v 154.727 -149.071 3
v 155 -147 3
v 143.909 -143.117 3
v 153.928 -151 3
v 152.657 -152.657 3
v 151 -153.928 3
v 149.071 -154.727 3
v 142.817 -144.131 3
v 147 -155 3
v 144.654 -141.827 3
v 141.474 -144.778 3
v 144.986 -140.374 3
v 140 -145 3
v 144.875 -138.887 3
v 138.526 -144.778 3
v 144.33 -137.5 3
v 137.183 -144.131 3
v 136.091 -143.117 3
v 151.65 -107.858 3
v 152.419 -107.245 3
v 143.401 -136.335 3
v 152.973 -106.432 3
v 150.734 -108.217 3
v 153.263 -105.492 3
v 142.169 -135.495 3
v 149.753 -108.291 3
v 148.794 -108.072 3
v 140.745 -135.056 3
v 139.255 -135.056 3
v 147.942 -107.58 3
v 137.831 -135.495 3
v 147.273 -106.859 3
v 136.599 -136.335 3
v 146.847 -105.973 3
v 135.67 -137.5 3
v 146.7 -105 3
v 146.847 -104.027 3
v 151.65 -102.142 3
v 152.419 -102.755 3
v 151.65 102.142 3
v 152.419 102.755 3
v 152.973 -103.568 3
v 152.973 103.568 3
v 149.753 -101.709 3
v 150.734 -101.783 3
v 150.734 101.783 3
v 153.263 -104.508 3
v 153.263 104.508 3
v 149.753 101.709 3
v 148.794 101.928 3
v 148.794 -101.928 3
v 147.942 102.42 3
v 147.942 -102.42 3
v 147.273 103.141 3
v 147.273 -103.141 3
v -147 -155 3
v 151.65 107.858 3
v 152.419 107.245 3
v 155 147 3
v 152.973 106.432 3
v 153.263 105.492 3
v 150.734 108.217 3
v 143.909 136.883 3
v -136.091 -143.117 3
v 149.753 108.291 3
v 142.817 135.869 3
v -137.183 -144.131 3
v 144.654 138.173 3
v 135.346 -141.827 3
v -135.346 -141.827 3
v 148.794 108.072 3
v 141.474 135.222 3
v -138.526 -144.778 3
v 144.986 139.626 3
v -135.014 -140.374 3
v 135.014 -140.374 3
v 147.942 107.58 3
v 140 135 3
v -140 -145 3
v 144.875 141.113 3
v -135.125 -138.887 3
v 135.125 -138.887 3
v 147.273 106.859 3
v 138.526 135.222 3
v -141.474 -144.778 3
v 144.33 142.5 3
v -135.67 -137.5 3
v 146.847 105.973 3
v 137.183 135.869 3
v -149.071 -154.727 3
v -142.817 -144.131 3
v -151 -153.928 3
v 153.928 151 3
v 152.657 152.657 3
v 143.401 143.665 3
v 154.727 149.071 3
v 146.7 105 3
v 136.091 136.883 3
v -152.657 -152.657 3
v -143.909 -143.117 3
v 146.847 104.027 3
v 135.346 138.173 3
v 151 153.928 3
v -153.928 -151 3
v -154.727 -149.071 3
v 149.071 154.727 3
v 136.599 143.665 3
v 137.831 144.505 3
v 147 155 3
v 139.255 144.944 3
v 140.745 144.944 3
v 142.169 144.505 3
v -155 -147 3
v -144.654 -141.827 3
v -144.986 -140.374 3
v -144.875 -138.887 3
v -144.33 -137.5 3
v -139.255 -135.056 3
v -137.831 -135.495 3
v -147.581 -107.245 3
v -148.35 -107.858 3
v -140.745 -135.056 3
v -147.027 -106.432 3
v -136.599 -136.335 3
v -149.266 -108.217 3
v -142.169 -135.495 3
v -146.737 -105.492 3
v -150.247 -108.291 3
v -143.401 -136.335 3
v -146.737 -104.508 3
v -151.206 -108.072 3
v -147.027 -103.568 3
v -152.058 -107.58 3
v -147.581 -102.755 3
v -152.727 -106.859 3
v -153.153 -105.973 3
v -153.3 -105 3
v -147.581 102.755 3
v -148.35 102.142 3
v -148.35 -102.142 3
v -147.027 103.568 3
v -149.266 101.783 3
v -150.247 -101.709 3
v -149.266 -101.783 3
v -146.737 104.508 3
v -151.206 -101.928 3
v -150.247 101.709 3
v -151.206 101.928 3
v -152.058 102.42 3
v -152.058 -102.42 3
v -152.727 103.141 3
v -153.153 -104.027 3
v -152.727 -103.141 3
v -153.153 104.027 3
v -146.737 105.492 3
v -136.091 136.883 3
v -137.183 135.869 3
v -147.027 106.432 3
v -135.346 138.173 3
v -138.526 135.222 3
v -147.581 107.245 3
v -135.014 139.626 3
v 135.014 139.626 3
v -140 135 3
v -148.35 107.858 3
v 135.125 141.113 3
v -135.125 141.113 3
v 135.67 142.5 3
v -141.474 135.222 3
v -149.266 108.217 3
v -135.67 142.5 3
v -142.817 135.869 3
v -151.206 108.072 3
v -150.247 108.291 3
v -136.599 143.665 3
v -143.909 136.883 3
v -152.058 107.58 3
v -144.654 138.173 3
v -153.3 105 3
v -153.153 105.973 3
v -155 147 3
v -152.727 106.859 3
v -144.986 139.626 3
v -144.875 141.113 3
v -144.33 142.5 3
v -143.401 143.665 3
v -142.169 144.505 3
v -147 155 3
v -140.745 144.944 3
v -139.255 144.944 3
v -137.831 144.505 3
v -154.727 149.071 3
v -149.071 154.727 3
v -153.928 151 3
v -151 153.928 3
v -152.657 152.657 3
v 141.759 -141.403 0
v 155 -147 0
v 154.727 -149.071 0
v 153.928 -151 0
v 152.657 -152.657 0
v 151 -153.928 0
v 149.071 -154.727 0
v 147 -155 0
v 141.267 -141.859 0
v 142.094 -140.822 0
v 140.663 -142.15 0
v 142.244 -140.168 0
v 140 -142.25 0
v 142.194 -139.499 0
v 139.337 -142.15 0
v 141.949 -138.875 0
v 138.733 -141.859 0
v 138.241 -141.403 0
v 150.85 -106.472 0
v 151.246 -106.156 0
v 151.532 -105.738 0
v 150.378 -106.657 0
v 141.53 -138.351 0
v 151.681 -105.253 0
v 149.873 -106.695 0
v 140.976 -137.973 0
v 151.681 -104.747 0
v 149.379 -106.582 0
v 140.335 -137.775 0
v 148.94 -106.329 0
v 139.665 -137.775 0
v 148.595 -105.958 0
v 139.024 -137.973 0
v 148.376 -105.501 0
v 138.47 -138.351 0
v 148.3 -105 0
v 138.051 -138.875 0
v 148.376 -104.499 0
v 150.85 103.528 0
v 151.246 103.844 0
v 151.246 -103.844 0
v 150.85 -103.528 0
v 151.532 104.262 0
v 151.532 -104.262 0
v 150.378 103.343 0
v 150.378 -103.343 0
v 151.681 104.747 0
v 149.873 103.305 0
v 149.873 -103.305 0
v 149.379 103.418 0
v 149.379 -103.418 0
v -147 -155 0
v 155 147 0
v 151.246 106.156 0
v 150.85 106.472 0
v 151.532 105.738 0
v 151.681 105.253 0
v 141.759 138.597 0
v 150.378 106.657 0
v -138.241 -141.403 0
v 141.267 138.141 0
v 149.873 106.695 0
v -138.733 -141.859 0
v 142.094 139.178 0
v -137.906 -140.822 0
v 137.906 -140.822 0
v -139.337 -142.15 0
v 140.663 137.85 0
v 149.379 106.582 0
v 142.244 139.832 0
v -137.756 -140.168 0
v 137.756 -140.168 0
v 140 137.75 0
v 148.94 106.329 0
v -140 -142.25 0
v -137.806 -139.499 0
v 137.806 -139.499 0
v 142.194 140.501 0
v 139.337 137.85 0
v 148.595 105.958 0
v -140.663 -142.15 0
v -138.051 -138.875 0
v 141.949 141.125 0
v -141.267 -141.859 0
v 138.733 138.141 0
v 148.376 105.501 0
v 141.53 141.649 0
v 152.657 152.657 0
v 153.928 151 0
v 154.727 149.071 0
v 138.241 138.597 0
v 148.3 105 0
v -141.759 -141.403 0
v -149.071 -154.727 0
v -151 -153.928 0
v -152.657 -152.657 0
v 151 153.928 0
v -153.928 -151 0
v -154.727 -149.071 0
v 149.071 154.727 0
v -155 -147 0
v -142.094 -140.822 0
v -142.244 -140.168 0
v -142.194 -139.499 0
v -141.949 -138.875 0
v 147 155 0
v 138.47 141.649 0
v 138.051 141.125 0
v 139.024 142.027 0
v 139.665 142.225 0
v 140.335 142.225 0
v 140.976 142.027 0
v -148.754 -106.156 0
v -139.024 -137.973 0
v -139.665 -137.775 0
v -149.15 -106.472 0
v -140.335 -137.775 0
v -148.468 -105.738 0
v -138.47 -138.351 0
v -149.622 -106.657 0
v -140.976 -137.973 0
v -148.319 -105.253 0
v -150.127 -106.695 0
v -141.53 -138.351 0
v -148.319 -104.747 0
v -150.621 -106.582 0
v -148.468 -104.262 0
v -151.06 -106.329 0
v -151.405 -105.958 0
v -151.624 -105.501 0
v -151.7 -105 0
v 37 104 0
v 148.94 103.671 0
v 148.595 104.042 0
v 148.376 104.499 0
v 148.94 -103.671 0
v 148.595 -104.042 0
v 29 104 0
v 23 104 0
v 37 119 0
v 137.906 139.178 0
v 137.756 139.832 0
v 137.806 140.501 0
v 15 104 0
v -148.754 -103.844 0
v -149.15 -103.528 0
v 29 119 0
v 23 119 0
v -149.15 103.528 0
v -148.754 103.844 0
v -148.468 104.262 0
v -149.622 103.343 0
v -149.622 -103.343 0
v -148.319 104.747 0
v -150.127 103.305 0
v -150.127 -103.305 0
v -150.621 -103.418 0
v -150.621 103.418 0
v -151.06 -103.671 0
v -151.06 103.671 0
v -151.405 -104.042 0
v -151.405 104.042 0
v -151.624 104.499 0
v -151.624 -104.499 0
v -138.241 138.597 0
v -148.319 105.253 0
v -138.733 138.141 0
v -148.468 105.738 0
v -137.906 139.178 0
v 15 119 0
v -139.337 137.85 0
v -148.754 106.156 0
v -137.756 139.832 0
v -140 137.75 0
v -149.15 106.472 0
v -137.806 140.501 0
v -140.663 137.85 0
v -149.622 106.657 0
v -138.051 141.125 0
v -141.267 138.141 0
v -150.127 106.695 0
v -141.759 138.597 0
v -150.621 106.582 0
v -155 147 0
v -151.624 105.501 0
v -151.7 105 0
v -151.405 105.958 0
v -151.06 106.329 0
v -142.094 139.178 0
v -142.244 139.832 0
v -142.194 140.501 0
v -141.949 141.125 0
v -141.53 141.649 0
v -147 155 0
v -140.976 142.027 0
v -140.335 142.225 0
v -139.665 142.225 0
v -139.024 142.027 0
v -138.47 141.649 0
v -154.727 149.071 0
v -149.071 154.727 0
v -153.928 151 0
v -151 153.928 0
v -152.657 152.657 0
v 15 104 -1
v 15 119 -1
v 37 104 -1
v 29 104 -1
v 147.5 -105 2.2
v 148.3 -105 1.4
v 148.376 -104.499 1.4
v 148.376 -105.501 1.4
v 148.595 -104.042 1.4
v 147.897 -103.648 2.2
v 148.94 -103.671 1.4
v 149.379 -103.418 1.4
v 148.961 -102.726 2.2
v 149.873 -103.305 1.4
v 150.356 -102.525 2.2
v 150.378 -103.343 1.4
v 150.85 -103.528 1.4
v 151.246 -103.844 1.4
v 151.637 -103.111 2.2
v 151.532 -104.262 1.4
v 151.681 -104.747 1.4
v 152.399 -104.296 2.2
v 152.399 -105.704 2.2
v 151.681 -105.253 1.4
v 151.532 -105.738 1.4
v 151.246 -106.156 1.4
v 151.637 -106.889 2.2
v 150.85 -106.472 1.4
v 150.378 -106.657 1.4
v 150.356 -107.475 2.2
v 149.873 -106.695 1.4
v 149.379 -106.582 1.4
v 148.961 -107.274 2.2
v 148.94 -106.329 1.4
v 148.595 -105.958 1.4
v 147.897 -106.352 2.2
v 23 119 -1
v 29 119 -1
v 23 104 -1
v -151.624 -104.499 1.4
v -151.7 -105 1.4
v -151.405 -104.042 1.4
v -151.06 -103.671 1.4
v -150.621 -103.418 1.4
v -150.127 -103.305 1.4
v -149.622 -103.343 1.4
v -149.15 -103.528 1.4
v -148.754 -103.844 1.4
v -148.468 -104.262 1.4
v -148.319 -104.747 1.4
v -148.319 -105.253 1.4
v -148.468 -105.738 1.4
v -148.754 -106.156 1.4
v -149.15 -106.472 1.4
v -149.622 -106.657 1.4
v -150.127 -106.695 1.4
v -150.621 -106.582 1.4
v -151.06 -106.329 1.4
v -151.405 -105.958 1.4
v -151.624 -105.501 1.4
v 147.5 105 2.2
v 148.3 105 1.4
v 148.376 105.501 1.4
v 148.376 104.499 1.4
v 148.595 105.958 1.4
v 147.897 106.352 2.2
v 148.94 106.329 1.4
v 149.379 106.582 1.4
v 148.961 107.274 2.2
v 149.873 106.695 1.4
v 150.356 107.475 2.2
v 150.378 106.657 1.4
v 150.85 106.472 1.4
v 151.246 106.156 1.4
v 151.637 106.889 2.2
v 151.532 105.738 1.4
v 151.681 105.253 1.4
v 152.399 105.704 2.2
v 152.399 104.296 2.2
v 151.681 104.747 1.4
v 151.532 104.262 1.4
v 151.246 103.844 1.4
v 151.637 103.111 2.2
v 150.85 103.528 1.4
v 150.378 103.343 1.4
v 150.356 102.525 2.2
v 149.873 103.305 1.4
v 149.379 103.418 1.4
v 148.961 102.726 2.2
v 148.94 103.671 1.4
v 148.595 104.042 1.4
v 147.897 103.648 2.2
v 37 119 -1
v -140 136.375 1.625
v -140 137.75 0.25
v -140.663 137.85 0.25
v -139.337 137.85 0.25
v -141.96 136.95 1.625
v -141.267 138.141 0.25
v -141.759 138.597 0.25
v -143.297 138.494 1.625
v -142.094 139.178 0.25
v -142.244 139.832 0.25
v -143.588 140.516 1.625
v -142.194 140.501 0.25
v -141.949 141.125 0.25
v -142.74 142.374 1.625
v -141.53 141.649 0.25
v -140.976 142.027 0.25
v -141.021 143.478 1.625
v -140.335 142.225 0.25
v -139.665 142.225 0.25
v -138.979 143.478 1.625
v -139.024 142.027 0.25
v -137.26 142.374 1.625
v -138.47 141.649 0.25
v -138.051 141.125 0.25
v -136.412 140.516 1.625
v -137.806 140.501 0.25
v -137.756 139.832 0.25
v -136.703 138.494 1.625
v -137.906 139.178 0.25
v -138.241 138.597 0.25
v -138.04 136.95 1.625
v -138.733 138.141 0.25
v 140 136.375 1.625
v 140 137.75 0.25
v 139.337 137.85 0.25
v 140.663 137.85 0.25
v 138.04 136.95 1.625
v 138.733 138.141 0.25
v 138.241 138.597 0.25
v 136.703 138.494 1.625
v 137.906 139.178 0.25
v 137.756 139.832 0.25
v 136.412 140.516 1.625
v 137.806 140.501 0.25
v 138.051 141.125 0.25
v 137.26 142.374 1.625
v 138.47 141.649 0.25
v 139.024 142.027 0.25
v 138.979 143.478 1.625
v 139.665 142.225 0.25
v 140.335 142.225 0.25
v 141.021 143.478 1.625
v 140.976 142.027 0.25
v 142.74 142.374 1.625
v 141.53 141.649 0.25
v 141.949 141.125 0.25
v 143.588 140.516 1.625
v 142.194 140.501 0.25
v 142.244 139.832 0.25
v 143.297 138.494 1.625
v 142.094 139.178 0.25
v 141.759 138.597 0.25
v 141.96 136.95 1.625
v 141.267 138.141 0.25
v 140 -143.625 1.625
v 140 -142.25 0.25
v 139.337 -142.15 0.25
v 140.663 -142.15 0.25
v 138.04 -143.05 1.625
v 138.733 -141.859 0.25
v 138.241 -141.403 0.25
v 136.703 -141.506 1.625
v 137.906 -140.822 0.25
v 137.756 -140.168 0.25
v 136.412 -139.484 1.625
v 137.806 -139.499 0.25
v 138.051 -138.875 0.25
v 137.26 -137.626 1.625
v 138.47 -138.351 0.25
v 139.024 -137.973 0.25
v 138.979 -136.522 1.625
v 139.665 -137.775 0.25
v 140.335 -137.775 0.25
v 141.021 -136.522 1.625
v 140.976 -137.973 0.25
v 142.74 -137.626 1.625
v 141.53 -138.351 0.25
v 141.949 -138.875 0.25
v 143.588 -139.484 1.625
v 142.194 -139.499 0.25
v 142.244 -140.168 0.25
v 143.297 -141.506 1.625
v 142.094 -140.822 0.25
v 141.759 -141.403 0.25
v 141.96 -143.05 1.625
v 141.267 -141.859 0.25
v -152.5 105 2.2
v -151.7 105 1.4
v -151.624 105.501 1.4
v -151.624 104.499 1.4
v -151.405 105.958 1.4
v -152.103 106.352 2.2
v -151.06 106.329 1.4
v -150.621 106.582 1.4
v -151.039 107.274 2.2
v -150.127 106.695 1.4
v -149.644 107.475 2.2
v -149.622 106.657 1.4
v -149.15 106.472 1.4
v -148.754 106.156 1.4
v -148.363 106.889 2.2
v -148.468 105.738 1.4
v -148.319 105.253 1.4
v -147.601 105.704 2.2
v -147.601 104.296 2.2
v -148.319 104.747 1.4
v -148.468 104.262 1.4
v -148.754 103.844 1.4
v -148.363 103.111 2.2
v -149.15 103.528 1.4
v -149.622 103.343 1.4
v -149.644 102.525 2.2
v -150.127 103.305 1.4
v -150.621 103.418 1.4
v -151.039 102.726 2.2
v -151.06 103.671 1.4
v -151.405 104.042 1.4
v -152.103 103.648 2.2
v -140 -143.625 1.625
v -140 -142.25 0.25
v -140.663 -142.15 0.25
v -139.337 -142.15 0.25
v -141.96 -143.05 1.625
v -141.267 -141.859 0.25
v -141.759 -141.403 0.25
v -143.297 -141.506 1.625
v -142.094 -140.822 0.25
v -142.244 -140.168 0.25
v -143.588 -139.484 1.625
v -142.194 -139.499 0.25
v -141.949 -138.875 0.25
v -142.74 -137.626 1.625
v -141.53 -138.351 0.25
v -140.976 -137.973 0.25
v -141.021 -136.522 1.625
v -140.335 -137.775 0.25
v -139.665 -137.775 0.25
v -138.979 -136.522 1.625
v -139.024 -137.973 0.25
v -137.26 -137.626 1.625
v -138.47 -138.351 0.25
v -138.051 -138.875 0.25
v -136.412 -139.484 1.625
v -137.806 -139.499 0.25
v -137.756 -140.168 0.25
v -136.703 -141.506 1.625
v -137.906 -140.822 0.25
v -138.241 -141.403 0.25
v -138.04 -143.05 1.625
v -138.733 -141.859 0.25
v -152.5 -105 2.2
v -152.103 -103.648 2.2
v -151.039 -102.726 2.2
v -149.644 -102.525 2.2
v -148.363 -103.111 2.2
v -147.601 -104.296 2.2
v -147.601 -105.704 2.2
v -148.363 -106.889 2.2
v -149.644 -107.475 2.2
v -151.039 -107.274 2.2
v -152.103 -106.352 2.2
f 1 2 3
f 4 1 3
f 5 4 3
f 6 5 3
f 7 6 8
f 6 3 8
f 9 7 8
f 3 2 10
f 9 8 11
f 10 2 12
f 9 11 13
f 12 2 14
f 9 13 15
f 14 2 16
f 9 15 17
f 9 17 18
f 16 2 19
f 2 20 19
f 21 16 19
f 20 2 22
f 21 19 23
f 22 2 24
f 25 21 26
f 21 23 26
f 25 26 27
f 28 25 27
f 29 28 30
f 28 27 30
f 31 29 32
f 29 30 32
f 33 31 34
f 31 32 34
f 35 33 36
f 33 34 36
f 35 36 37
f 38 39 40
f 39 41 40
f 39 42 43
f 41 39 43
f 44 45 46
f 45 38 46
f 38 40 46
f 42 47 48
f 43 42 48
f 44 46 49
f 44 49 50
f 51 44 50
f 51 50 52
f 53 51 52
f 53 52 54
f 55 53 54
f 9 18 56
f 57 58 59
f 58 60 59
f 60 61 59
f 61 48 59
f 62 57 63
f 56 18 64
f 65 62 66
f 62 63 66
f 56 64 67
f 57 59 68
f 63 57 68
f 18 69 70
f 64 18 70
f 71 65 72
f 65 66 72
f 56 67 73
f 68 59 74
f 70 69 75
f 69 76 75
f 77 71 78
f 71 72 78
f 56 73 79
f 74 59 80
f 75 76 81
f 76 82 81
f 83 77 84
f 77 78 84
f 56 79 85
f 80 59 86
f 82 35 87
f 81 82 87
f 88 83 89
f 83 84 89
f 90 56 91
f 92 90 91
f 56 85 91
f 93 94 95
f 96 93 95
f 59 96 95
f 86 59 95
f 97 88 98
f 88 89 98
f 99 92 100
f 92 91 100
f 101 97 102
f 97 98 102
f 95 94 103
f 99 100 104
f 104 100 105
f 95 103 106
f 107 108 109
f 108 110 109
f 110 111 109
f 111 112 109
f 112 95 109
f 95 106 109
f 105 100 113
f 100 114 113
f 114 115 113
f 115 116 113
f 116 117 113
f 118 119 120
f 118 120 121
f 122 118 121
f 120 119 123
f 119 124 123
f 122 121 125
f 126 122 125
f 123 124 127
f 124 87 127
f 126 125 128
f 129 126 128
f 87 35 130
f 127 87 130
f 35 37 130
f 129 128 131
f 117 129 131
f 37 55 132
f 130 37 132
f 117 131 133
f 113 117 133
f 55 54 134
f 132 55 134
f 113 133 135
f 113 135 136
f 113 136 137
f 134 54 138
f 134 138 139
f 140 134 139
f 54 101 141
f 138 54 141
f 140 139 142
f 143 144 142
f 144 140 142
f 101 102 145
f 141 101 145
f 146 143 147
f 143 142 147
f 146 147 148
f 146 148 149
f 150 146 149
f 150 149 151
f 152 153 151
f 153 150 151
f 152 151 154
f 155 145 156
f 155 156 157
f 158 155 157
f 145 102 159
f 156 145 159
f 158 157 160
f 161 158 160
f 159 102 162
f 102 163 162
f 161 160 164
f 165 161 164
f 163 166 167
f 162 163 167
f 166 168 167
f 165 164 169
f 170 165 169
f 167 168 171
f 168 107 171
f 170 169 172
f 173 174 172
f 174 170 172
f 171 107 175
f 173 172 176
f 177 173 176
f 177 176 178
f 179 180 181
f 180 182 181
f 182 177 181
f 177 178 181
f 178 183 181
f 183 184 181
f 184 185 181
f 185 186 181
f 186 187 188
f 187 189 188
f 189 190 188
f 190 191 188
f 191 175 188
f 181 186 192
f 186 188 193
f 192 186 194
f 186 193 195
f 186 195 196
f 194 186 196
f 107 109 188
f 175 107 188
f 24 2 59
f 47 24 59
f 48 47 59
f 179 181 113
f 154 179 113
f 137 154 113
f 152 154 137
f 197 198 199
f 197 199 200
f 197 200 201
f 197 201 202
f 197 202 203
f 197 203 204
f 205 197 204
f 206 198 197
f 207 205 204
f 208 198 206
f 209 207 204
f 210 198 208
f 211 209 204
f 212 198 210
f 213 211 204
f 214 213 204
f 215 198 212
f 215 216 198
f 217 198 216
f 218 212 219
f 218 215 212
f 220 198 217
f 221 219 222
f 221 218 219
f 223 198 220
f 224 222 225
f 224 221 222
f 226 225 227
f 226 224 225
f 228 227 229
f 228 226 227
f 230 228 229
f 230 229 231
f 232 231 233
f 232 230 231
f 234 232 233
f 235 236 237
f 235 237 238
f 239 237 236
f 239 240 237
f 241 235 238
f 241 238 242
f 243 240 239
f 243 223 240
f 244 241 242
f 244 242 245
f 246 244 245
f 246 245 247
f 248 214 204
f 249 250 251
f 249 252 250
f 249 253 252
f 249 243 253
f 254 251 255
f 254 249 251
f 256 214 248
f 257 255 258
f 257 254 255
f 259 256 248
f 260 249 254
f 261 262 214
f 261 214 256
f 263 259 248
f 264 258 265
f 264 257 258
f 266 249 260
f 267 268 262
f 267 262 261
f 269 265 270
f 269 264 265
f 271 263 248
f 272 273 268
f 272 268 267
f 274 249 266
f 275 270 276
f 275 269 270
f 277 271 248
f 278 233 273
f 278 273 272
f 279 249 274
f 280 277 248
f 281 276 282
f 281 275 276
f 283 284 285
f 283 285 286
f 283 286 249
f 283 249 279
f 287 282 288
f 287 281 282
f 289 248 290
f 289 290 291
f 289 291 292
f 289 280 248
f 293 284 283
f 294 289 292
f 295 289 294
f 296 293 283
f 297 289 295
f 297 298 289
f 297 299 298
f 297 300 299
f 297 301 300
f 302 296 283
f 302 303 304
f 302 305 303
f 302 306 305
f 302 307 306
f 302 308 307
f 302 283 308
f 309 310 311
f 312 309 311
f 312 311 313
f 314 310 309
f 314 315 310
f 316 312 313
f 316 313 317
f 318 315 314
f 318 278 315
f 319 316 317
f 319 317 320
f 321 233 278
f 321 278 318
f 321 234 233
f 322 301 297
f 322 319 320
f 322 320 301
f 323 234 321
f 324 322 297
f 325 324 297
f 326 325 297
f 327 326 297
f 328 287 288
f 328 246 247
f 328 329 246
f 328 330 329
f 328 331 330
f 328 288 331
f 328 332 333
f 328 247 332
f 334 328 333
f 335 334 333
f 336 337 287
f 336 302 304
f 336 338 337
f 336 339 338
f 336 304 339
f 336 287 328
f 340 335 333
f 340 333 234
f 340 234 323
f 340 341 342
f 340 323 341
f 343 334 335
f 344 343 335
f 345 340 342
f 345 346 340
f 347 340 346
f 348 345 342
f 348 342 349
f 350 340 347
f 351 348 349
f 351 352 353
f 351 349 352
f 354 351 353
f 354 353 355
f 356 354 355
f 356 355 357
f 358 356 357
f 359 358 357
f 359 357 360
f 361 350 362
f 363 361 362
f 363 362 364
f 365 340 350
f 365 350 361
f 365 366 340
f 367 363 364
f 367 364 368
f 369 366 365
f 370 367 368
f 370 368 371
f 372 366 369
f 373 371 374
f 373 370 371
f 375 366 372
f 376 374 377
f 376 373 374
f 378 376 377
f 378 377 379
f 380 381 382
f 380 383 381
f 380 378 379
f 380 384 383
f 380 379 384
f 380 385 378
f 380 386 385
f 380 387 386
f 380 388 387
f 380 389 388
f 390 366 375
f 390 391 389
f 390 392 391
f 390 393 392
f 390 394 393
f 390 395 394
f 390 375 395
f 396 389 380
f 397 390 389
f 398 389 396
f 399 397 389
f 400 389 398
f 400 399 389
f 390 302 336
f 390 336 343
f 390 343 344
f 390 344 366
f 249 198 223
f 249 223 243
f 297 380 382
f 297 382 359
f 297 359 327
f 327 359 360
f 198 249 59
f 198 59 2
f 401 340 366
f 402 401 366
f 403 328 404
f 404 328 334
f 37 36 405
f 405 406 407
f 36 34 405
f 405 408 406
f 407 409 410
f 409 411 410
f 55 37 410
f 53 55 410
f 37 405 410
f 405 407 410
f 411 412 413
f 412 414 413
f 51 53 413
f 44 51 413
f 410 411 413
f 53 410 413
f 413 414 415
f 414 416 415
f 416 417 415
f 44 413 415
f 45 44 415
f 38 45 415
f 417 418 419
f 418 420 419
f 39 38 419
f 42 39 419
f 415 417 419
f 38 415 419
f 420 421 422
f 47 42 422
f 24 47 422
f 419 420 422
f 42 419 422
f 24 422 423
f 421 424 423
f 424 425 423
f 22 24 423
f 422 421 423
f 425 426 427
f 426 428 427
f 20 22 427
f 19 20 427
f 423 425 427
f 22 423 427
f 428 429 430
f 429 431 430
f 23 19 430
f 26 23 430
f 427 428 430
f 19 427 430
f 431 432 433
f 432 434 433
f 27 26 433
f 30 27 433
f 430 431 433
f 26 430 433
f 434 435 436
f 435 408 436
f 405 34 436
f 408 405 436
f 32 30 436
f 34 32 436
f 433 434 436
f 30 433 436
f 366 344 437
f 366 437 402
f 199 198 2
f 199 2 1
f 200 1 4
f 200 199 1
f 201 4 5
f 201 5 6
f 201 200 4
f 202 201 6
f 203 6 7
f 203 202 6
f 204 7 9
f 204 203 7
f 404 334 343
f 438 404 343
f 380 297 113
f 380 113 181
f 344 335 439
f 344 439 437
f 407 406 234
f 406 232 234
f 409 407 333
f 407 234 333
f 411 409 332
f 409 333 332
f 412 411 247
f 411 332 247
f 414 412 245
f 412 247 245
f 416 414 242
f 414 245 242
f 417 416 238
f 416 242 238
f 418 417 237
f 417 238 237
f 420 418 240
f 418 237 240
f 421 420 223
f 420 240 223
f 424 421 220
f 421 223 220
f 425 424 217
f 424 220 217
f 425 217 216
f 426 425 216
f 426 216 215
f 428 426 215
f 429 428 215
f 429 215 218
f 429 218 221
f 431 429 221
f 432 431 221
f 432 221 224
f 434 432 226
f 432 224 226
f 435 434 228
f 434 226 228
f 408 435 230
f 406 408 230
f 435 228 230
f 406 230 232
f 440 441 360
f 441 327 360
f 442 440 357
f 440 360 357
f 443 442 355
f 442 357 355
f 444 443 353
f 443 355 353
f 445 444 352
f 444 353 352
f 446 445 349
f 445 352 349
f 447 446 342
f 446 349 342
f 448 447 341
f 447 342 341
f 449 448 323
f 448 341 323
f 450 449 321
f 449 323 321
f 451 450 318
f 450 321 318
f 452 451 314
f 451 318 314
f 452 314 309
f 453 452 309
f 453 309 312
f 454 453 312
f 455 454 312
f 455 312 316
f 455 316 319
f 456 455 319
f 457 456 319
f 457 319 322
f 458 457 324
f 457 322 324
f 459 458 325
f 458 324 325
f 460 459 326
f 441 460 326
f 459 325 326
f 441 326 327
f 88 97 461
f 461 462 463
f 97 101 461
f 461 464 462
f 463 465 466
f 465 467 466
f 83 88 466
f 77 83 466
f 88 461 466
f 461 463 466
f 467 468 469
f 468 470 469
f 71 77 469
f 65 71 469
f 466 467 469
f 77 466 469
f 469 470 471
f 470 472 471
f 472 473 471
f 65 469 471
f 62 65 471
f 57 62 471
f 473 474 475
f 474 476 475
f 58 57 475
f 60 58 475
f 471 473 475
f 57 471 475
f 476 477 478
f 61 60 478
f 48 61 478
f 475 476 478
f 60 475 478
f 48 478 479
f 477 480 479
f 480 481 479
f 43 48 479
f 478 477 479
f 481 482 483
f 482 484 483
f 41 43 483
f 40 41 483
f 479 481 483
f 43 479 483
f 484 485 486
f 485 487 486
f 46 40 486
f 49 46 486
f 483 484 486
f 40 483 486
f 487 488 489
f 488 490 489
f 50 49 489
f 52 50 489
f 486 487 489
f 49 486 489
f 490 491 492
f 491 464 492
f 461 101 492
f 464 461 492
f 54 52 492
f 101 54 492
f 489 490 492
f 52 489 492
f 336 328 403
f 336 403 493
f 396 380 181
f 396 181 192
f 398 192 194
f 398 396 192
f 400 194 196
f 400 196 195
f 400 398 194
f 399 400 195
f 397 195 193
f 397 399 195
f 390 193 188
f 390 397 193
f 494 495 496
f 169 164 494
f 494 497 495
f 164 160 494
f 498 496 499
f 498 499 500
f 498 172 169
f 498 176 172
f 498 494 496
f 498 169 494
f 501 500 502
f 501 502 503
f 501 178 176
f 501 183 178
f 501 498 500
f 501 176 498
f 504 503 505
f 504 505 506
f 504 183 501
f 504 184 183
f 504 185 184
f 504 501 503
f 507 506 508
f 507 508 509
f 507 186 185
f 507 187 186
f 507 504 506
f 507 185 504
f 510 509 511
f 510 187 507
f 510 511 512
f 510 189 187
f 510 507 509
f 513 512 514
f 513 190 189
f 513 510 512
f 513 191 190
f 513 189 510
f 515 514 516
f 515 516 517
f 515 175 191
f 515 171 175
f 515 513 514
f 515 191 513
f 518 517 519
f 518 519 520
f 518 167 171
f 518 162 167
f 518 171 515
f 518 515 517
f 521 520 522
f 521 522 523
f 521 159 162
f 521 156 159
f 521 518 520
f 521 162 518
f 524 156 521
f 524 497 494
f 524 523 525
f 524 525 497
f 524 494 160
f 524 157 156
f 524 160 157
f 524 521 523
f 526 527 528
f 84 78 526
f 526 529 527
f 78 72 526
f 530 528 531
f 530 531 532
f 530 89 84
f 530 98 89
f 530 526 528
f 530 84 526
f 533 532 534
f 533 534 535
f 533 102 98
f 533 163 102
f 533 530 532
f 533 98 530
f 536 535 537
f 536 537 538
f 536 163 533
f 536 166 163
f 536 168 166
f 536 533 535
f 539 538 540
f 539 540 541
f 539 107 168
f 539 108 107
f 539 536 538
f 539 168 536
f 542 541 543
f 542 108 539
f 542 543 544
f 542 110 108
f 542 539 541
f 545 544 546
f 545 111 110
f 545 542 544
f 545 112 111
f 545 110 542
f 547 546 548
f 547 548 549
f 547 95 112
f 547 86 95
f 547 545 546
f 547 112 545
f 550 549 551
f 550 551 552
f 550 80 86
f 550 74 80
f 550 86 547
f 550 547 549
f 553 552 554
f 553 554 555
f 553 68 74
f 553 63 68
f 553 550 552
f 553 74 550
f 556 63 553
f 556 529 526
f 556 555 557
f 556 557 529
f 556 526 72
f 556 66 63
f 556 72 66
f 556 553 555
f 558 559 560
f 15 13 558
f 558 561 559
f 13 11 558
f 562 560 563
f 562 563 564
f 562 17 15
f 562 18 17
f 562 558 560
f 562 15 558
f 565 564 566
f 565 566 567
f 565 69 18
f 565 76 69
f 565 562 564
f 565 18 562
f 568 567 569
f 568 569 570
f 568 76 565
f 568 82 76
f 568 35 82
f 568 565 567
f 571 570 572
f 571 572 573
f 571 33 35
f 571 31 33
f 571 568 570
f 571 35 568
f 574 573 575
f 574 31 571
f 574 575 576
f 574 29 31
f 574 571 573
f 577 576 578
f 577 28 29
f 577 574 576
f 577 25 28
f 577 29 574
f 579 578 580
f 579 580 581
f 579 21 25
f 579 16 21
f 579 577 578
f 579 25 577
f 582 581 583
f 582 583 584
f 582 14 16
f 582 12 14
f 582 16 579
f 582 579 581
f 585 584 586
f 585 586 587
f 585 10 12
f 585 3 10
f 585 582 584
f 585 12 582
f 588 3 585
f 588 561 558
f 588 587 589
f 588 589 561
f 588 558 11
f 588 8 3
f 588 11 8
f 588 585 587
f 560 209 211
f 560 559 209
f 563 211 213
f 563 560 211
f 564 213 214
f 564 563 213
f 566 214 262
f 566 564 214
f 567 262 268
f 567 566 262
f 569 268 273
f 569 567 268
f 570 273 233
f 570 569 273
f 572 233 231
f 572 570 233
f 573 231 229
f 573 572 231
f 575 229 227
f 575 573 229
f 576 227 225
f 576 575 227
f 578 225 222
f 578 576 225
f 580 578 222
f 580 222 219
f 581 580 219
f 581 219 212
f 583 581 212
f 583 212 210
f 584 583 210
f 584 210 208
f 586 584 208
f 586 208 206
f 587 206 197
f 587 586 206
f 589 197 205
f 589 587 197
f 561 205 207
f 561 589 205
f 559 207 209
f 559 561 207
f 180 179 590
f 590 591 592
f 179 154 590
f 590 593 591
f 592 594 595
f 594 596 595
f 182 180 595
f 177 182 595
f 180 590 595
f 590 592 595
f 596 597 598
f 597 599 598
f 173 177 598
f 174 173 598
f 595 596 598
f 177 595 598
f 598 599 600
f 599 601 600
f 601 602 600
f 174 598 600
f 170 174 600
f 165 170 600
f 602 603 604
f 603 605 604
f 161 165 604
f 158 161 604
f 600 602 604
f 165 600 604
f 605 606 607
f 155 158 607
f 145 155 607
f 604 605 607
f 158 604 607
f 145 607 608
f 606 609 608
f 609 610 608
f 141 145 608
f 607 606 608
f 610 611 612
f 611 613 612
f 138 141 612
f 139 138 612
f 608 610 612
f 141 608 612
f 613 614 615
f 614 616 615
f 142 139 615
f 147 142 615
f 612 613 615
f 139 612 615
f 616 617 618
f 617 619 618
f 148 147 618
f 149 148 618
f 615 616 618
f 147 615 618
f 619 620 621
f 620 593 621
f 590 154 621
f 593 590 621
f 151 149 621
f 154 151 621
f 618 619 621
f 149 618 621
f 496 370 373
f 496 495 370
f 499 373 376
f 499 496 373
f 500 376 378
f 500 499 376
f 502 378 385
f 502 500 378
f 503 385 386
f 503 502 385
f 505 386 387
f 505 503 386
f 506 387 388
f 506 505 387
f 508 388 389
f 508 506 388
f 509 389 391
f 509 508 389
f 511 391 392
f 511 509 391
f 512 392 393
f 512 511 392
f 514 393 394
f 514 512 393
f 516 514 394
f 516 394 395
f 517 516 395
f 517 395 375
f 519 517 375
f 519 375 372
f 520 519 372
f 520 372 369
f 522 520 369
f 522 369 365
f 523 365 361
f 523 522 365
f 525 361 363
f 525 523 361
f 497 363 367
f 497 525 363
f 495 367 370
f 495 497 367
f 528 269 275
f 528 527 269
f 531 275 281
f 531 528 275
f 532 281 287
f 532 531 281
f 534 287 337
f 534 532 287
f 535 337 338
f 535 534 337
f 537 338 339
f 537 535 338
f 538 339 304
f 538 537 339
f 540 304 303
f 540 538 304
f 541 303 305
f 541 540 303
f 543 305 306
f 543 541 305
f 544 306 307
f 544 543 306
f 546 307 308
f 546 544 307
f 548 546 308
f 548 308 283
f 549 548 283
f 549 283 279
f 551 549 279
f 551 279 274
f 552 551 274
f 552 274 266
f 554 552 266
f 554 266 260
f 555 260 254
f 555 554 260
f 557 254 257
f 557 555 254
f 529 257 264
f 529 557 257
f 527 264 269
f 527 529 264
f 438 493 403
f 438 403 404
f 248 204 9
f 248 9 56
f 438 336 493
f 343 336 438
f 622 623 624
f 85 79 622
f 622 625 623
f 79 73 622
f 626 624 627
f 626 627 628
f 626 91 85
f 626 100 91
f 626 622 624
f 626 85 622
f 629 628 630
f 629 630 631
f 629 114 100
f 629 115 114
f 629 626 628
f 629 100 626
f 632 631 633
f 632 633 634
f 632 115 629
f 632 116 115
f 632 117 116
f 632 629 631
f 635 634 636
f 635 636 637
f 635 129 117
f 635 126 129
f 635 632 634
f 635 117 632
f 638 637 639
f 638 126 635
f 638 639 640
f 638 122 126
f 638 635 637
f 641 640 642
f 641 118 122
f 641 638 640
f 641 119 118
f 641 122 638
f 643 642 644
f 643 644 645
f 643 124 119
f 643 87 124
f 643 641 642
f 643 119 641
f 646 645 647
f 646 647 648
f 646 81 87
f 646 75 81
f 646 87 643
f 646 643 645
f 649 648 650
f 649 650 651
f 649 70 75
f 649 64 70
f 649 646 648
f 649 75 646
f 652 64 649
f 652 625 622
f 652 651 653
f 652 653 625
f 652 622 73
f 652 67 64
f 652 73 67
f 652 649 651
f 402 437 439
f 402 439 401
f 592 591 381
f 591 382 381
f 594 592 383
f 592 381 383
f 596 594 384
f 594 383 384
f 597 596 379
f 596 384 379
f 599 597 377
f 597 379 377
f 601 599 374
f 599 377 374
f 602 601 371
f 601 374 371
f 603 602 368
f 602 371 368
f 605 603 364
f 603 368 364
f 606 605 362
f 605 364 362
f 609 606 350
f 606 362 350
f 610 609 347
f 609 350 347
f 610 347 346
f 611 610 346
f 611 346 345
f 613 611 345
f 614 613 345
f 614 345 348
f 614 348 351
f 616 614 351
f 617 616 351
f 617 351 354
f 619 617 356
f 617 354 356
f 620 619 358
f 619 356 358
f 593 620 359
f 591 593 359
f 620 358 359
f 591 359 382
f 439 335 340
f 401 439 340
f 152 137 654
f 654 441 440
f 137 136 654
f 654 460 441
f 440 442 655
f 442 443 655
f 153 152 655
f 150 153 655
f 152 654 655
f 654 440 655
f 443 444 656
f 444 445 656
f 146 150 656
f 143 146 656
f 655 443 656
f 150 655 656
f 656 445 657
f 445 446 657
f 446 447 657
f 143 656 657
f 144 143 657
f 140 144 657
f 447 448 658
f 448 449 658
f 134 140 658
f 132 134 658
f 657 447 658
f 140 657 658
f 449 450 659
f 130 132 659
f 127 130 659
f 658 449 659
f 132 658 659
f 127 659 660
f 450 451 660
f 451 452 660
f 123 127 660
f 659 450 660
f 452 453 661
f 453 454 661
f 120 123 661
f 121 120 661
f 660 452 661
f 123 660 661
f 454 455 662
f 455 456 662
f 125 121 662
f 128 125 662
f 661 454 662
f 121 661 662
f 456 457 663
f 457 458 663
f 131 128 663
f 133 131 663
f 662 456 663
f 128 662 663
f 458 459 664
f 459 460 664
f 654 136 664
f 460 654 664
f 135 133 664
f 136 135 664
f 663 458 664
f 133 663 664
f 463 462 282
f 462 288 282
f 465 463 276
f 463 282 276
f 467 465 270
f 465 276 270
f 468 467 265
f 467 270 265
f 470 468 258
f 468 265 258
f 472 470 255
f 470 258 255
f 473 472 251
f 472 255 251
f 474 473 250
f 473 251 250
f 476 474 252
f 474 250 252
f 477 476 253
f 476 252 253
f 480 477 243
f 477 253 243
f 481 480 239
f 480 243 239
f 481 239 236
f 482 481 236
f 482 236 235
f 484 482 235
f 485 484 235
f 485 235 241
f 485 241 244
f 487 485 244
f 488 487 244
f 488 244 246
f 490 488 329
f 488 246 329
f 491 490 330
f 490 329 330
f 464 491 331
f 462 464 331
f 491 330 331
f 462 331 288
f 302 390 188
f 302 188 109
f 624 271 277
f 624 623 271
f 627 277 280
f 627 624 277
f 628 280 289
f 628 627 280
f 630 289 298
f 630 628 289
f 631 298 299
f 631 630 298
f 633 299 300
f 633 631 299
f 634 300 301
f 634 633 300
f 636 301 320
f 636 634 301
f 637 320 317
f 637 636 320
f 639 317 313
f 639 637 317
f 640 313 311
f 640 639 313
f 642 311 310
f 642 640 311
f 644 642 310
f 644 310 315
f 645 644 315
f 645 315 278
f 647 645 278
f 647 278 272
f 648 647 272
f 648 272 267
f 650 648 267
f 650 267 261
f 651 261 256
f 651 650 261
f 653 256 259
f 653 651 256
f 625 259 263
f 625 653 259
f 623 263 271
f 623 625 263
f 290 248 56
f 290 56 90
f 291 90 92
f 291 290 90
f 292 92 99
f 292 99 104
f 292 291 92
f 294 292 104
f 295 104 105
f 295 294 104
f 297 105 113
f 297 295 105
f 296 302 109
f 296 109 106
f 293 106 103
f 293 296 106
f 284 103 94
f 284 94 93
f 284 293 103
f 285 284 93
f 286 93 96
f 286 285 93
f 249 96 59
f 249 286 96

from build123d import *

# Parameters (mm, degrees)
EXTRUDE_1_DEPTH             = 3
HOLE_WIZARD_1_AT_2_COUNT    = 2
HOLE_WIZARD_1_AT_2_PITCH    = 280
HOLE_WIZARD_1_AT_3_COUNT    = 2
HOLE_WIZARD_1_AT_3_PITCH    = 395.979797464
HOLE_WIZARD_1_AT_4_COUNT    = 2
HOLE_WIZARD_1_AT_4_PITCH    = 280
SKETCH_4_W                  = 8
SKETCH_4_H                  = 15
EXTRUDE_2_DEPTH             = 1
HOLE_WIZARD_1_2_D           = 3.4
HOLE_WIZARD_1_2_CSINK_D     = 6.6
HOLE_WIZARD_1_2_CSINK_ANGLE = 90


with BuildPart() as part:
    # 草图1 → 凸台-拉伸1 (new body)
    with BuildSketch(Plane.XY):
        with BuildLine():
            Line((-147, 155), (147, 155))
            ThreePointArc((147, 155), (152.656854249, 152.656854249), (155, 147))
            Line((155, 147), (155, -147))
            ThreePointArc((155, -147), (152.656854249, -152.656854249), (147, -155))
            Line((147, -155), (-147, -155))
            ThreePointArc((-147, -155), (-152.656854249, -152.656854249), (-155, -147))
            Line((-155, -147), (-155, 147))
            ThreePointArc((-155, 147), (-152.656854249, 152.656854249), (-147, 155))
        make_face()
    extrude(amount=EXTRUDE_1_DEPTH)

    # 草图2 → Hole Wizard 1 (revolve, cut)
    with BuildSketch(Plane(origin=(-140, 140, 3), x_dir=(0, -1, 0), z_dir=(1, 0, 0))):
        Polygon((0, 0), (0, 3), (2.25, 3), (2.25, 2.75), (5, 0), align=None)
    hole_wizard_1 = revolve(axis=Axis((-140, 140, 9.35), (0, 0, -1)), mode=Mode.SUBTRACT)

    # Hole Wizard 1 at 2: Hole Wizard 1 ×2
    with Locations(*[(i * HOLE_WIZARD_1_AT_2_PITCH, 0, 0) for i in range(1, HOLE_WIZARD_1_AT_2_COUNT)]):
        add(hole_wizard_1, mode=Mode.SUBTRACT)

    # Hole Wizard 1 at 3: Hole Wizard 1 ×2
    with Locations(*[Vector(0.707106781, -0.707106781, 0) * (i * HOLE_WIZARD_1_AT_3_PITCH) for i in range(1, HOLE_WIZARD_1_AT_3_COUNT)]):
        add(hole_wizard_1, mode=Mode.SUBTRACT)

    # Hole Wizard 1 at 4: Hole Wizard 1 ×2
    with Locations(*[(0, -i * HOLE_WIZARD_1_AT_4_PITCH, 0) for i in range(1, HOLE_WIZARD_1_AT_4_COUNT)]):
        add(hole_wizard_1, mode=Mode.SUBTRACT)

    # 草图4 → 凸台-拉伸2 (add)
    with BuildSketch(Plane(origin=(0, 0, 0), x_dir=(-1, 0, 0), z_dir=(0, 0, -1))):
        with Locations((-19, 111.5)):
            Rectangle(SKETCH_4_W, SKETCH_4_H)
        with Locations((-33, 111.5)):
            Rectangle(SKETCH_4_W, SKETCH_4_H)
    extrude(amount=EXTRUDE_2_DEPTH)

    # Hole Wizard 1 2 (through all)
    with Locations(Plane.XY.offset(3)):
        with Locations((150, -105), (150, 105), (-150, 105), (-150, -105)):
            CounterSinkHole(HOLE_WIZARD_1_2_D / 2, HOLE_WIZARD_1_2_CSINK_D / 2, counter_sink_angle=HOLE_WIZARD_1_2_CSINK_ANGLE)


solid = part.part
